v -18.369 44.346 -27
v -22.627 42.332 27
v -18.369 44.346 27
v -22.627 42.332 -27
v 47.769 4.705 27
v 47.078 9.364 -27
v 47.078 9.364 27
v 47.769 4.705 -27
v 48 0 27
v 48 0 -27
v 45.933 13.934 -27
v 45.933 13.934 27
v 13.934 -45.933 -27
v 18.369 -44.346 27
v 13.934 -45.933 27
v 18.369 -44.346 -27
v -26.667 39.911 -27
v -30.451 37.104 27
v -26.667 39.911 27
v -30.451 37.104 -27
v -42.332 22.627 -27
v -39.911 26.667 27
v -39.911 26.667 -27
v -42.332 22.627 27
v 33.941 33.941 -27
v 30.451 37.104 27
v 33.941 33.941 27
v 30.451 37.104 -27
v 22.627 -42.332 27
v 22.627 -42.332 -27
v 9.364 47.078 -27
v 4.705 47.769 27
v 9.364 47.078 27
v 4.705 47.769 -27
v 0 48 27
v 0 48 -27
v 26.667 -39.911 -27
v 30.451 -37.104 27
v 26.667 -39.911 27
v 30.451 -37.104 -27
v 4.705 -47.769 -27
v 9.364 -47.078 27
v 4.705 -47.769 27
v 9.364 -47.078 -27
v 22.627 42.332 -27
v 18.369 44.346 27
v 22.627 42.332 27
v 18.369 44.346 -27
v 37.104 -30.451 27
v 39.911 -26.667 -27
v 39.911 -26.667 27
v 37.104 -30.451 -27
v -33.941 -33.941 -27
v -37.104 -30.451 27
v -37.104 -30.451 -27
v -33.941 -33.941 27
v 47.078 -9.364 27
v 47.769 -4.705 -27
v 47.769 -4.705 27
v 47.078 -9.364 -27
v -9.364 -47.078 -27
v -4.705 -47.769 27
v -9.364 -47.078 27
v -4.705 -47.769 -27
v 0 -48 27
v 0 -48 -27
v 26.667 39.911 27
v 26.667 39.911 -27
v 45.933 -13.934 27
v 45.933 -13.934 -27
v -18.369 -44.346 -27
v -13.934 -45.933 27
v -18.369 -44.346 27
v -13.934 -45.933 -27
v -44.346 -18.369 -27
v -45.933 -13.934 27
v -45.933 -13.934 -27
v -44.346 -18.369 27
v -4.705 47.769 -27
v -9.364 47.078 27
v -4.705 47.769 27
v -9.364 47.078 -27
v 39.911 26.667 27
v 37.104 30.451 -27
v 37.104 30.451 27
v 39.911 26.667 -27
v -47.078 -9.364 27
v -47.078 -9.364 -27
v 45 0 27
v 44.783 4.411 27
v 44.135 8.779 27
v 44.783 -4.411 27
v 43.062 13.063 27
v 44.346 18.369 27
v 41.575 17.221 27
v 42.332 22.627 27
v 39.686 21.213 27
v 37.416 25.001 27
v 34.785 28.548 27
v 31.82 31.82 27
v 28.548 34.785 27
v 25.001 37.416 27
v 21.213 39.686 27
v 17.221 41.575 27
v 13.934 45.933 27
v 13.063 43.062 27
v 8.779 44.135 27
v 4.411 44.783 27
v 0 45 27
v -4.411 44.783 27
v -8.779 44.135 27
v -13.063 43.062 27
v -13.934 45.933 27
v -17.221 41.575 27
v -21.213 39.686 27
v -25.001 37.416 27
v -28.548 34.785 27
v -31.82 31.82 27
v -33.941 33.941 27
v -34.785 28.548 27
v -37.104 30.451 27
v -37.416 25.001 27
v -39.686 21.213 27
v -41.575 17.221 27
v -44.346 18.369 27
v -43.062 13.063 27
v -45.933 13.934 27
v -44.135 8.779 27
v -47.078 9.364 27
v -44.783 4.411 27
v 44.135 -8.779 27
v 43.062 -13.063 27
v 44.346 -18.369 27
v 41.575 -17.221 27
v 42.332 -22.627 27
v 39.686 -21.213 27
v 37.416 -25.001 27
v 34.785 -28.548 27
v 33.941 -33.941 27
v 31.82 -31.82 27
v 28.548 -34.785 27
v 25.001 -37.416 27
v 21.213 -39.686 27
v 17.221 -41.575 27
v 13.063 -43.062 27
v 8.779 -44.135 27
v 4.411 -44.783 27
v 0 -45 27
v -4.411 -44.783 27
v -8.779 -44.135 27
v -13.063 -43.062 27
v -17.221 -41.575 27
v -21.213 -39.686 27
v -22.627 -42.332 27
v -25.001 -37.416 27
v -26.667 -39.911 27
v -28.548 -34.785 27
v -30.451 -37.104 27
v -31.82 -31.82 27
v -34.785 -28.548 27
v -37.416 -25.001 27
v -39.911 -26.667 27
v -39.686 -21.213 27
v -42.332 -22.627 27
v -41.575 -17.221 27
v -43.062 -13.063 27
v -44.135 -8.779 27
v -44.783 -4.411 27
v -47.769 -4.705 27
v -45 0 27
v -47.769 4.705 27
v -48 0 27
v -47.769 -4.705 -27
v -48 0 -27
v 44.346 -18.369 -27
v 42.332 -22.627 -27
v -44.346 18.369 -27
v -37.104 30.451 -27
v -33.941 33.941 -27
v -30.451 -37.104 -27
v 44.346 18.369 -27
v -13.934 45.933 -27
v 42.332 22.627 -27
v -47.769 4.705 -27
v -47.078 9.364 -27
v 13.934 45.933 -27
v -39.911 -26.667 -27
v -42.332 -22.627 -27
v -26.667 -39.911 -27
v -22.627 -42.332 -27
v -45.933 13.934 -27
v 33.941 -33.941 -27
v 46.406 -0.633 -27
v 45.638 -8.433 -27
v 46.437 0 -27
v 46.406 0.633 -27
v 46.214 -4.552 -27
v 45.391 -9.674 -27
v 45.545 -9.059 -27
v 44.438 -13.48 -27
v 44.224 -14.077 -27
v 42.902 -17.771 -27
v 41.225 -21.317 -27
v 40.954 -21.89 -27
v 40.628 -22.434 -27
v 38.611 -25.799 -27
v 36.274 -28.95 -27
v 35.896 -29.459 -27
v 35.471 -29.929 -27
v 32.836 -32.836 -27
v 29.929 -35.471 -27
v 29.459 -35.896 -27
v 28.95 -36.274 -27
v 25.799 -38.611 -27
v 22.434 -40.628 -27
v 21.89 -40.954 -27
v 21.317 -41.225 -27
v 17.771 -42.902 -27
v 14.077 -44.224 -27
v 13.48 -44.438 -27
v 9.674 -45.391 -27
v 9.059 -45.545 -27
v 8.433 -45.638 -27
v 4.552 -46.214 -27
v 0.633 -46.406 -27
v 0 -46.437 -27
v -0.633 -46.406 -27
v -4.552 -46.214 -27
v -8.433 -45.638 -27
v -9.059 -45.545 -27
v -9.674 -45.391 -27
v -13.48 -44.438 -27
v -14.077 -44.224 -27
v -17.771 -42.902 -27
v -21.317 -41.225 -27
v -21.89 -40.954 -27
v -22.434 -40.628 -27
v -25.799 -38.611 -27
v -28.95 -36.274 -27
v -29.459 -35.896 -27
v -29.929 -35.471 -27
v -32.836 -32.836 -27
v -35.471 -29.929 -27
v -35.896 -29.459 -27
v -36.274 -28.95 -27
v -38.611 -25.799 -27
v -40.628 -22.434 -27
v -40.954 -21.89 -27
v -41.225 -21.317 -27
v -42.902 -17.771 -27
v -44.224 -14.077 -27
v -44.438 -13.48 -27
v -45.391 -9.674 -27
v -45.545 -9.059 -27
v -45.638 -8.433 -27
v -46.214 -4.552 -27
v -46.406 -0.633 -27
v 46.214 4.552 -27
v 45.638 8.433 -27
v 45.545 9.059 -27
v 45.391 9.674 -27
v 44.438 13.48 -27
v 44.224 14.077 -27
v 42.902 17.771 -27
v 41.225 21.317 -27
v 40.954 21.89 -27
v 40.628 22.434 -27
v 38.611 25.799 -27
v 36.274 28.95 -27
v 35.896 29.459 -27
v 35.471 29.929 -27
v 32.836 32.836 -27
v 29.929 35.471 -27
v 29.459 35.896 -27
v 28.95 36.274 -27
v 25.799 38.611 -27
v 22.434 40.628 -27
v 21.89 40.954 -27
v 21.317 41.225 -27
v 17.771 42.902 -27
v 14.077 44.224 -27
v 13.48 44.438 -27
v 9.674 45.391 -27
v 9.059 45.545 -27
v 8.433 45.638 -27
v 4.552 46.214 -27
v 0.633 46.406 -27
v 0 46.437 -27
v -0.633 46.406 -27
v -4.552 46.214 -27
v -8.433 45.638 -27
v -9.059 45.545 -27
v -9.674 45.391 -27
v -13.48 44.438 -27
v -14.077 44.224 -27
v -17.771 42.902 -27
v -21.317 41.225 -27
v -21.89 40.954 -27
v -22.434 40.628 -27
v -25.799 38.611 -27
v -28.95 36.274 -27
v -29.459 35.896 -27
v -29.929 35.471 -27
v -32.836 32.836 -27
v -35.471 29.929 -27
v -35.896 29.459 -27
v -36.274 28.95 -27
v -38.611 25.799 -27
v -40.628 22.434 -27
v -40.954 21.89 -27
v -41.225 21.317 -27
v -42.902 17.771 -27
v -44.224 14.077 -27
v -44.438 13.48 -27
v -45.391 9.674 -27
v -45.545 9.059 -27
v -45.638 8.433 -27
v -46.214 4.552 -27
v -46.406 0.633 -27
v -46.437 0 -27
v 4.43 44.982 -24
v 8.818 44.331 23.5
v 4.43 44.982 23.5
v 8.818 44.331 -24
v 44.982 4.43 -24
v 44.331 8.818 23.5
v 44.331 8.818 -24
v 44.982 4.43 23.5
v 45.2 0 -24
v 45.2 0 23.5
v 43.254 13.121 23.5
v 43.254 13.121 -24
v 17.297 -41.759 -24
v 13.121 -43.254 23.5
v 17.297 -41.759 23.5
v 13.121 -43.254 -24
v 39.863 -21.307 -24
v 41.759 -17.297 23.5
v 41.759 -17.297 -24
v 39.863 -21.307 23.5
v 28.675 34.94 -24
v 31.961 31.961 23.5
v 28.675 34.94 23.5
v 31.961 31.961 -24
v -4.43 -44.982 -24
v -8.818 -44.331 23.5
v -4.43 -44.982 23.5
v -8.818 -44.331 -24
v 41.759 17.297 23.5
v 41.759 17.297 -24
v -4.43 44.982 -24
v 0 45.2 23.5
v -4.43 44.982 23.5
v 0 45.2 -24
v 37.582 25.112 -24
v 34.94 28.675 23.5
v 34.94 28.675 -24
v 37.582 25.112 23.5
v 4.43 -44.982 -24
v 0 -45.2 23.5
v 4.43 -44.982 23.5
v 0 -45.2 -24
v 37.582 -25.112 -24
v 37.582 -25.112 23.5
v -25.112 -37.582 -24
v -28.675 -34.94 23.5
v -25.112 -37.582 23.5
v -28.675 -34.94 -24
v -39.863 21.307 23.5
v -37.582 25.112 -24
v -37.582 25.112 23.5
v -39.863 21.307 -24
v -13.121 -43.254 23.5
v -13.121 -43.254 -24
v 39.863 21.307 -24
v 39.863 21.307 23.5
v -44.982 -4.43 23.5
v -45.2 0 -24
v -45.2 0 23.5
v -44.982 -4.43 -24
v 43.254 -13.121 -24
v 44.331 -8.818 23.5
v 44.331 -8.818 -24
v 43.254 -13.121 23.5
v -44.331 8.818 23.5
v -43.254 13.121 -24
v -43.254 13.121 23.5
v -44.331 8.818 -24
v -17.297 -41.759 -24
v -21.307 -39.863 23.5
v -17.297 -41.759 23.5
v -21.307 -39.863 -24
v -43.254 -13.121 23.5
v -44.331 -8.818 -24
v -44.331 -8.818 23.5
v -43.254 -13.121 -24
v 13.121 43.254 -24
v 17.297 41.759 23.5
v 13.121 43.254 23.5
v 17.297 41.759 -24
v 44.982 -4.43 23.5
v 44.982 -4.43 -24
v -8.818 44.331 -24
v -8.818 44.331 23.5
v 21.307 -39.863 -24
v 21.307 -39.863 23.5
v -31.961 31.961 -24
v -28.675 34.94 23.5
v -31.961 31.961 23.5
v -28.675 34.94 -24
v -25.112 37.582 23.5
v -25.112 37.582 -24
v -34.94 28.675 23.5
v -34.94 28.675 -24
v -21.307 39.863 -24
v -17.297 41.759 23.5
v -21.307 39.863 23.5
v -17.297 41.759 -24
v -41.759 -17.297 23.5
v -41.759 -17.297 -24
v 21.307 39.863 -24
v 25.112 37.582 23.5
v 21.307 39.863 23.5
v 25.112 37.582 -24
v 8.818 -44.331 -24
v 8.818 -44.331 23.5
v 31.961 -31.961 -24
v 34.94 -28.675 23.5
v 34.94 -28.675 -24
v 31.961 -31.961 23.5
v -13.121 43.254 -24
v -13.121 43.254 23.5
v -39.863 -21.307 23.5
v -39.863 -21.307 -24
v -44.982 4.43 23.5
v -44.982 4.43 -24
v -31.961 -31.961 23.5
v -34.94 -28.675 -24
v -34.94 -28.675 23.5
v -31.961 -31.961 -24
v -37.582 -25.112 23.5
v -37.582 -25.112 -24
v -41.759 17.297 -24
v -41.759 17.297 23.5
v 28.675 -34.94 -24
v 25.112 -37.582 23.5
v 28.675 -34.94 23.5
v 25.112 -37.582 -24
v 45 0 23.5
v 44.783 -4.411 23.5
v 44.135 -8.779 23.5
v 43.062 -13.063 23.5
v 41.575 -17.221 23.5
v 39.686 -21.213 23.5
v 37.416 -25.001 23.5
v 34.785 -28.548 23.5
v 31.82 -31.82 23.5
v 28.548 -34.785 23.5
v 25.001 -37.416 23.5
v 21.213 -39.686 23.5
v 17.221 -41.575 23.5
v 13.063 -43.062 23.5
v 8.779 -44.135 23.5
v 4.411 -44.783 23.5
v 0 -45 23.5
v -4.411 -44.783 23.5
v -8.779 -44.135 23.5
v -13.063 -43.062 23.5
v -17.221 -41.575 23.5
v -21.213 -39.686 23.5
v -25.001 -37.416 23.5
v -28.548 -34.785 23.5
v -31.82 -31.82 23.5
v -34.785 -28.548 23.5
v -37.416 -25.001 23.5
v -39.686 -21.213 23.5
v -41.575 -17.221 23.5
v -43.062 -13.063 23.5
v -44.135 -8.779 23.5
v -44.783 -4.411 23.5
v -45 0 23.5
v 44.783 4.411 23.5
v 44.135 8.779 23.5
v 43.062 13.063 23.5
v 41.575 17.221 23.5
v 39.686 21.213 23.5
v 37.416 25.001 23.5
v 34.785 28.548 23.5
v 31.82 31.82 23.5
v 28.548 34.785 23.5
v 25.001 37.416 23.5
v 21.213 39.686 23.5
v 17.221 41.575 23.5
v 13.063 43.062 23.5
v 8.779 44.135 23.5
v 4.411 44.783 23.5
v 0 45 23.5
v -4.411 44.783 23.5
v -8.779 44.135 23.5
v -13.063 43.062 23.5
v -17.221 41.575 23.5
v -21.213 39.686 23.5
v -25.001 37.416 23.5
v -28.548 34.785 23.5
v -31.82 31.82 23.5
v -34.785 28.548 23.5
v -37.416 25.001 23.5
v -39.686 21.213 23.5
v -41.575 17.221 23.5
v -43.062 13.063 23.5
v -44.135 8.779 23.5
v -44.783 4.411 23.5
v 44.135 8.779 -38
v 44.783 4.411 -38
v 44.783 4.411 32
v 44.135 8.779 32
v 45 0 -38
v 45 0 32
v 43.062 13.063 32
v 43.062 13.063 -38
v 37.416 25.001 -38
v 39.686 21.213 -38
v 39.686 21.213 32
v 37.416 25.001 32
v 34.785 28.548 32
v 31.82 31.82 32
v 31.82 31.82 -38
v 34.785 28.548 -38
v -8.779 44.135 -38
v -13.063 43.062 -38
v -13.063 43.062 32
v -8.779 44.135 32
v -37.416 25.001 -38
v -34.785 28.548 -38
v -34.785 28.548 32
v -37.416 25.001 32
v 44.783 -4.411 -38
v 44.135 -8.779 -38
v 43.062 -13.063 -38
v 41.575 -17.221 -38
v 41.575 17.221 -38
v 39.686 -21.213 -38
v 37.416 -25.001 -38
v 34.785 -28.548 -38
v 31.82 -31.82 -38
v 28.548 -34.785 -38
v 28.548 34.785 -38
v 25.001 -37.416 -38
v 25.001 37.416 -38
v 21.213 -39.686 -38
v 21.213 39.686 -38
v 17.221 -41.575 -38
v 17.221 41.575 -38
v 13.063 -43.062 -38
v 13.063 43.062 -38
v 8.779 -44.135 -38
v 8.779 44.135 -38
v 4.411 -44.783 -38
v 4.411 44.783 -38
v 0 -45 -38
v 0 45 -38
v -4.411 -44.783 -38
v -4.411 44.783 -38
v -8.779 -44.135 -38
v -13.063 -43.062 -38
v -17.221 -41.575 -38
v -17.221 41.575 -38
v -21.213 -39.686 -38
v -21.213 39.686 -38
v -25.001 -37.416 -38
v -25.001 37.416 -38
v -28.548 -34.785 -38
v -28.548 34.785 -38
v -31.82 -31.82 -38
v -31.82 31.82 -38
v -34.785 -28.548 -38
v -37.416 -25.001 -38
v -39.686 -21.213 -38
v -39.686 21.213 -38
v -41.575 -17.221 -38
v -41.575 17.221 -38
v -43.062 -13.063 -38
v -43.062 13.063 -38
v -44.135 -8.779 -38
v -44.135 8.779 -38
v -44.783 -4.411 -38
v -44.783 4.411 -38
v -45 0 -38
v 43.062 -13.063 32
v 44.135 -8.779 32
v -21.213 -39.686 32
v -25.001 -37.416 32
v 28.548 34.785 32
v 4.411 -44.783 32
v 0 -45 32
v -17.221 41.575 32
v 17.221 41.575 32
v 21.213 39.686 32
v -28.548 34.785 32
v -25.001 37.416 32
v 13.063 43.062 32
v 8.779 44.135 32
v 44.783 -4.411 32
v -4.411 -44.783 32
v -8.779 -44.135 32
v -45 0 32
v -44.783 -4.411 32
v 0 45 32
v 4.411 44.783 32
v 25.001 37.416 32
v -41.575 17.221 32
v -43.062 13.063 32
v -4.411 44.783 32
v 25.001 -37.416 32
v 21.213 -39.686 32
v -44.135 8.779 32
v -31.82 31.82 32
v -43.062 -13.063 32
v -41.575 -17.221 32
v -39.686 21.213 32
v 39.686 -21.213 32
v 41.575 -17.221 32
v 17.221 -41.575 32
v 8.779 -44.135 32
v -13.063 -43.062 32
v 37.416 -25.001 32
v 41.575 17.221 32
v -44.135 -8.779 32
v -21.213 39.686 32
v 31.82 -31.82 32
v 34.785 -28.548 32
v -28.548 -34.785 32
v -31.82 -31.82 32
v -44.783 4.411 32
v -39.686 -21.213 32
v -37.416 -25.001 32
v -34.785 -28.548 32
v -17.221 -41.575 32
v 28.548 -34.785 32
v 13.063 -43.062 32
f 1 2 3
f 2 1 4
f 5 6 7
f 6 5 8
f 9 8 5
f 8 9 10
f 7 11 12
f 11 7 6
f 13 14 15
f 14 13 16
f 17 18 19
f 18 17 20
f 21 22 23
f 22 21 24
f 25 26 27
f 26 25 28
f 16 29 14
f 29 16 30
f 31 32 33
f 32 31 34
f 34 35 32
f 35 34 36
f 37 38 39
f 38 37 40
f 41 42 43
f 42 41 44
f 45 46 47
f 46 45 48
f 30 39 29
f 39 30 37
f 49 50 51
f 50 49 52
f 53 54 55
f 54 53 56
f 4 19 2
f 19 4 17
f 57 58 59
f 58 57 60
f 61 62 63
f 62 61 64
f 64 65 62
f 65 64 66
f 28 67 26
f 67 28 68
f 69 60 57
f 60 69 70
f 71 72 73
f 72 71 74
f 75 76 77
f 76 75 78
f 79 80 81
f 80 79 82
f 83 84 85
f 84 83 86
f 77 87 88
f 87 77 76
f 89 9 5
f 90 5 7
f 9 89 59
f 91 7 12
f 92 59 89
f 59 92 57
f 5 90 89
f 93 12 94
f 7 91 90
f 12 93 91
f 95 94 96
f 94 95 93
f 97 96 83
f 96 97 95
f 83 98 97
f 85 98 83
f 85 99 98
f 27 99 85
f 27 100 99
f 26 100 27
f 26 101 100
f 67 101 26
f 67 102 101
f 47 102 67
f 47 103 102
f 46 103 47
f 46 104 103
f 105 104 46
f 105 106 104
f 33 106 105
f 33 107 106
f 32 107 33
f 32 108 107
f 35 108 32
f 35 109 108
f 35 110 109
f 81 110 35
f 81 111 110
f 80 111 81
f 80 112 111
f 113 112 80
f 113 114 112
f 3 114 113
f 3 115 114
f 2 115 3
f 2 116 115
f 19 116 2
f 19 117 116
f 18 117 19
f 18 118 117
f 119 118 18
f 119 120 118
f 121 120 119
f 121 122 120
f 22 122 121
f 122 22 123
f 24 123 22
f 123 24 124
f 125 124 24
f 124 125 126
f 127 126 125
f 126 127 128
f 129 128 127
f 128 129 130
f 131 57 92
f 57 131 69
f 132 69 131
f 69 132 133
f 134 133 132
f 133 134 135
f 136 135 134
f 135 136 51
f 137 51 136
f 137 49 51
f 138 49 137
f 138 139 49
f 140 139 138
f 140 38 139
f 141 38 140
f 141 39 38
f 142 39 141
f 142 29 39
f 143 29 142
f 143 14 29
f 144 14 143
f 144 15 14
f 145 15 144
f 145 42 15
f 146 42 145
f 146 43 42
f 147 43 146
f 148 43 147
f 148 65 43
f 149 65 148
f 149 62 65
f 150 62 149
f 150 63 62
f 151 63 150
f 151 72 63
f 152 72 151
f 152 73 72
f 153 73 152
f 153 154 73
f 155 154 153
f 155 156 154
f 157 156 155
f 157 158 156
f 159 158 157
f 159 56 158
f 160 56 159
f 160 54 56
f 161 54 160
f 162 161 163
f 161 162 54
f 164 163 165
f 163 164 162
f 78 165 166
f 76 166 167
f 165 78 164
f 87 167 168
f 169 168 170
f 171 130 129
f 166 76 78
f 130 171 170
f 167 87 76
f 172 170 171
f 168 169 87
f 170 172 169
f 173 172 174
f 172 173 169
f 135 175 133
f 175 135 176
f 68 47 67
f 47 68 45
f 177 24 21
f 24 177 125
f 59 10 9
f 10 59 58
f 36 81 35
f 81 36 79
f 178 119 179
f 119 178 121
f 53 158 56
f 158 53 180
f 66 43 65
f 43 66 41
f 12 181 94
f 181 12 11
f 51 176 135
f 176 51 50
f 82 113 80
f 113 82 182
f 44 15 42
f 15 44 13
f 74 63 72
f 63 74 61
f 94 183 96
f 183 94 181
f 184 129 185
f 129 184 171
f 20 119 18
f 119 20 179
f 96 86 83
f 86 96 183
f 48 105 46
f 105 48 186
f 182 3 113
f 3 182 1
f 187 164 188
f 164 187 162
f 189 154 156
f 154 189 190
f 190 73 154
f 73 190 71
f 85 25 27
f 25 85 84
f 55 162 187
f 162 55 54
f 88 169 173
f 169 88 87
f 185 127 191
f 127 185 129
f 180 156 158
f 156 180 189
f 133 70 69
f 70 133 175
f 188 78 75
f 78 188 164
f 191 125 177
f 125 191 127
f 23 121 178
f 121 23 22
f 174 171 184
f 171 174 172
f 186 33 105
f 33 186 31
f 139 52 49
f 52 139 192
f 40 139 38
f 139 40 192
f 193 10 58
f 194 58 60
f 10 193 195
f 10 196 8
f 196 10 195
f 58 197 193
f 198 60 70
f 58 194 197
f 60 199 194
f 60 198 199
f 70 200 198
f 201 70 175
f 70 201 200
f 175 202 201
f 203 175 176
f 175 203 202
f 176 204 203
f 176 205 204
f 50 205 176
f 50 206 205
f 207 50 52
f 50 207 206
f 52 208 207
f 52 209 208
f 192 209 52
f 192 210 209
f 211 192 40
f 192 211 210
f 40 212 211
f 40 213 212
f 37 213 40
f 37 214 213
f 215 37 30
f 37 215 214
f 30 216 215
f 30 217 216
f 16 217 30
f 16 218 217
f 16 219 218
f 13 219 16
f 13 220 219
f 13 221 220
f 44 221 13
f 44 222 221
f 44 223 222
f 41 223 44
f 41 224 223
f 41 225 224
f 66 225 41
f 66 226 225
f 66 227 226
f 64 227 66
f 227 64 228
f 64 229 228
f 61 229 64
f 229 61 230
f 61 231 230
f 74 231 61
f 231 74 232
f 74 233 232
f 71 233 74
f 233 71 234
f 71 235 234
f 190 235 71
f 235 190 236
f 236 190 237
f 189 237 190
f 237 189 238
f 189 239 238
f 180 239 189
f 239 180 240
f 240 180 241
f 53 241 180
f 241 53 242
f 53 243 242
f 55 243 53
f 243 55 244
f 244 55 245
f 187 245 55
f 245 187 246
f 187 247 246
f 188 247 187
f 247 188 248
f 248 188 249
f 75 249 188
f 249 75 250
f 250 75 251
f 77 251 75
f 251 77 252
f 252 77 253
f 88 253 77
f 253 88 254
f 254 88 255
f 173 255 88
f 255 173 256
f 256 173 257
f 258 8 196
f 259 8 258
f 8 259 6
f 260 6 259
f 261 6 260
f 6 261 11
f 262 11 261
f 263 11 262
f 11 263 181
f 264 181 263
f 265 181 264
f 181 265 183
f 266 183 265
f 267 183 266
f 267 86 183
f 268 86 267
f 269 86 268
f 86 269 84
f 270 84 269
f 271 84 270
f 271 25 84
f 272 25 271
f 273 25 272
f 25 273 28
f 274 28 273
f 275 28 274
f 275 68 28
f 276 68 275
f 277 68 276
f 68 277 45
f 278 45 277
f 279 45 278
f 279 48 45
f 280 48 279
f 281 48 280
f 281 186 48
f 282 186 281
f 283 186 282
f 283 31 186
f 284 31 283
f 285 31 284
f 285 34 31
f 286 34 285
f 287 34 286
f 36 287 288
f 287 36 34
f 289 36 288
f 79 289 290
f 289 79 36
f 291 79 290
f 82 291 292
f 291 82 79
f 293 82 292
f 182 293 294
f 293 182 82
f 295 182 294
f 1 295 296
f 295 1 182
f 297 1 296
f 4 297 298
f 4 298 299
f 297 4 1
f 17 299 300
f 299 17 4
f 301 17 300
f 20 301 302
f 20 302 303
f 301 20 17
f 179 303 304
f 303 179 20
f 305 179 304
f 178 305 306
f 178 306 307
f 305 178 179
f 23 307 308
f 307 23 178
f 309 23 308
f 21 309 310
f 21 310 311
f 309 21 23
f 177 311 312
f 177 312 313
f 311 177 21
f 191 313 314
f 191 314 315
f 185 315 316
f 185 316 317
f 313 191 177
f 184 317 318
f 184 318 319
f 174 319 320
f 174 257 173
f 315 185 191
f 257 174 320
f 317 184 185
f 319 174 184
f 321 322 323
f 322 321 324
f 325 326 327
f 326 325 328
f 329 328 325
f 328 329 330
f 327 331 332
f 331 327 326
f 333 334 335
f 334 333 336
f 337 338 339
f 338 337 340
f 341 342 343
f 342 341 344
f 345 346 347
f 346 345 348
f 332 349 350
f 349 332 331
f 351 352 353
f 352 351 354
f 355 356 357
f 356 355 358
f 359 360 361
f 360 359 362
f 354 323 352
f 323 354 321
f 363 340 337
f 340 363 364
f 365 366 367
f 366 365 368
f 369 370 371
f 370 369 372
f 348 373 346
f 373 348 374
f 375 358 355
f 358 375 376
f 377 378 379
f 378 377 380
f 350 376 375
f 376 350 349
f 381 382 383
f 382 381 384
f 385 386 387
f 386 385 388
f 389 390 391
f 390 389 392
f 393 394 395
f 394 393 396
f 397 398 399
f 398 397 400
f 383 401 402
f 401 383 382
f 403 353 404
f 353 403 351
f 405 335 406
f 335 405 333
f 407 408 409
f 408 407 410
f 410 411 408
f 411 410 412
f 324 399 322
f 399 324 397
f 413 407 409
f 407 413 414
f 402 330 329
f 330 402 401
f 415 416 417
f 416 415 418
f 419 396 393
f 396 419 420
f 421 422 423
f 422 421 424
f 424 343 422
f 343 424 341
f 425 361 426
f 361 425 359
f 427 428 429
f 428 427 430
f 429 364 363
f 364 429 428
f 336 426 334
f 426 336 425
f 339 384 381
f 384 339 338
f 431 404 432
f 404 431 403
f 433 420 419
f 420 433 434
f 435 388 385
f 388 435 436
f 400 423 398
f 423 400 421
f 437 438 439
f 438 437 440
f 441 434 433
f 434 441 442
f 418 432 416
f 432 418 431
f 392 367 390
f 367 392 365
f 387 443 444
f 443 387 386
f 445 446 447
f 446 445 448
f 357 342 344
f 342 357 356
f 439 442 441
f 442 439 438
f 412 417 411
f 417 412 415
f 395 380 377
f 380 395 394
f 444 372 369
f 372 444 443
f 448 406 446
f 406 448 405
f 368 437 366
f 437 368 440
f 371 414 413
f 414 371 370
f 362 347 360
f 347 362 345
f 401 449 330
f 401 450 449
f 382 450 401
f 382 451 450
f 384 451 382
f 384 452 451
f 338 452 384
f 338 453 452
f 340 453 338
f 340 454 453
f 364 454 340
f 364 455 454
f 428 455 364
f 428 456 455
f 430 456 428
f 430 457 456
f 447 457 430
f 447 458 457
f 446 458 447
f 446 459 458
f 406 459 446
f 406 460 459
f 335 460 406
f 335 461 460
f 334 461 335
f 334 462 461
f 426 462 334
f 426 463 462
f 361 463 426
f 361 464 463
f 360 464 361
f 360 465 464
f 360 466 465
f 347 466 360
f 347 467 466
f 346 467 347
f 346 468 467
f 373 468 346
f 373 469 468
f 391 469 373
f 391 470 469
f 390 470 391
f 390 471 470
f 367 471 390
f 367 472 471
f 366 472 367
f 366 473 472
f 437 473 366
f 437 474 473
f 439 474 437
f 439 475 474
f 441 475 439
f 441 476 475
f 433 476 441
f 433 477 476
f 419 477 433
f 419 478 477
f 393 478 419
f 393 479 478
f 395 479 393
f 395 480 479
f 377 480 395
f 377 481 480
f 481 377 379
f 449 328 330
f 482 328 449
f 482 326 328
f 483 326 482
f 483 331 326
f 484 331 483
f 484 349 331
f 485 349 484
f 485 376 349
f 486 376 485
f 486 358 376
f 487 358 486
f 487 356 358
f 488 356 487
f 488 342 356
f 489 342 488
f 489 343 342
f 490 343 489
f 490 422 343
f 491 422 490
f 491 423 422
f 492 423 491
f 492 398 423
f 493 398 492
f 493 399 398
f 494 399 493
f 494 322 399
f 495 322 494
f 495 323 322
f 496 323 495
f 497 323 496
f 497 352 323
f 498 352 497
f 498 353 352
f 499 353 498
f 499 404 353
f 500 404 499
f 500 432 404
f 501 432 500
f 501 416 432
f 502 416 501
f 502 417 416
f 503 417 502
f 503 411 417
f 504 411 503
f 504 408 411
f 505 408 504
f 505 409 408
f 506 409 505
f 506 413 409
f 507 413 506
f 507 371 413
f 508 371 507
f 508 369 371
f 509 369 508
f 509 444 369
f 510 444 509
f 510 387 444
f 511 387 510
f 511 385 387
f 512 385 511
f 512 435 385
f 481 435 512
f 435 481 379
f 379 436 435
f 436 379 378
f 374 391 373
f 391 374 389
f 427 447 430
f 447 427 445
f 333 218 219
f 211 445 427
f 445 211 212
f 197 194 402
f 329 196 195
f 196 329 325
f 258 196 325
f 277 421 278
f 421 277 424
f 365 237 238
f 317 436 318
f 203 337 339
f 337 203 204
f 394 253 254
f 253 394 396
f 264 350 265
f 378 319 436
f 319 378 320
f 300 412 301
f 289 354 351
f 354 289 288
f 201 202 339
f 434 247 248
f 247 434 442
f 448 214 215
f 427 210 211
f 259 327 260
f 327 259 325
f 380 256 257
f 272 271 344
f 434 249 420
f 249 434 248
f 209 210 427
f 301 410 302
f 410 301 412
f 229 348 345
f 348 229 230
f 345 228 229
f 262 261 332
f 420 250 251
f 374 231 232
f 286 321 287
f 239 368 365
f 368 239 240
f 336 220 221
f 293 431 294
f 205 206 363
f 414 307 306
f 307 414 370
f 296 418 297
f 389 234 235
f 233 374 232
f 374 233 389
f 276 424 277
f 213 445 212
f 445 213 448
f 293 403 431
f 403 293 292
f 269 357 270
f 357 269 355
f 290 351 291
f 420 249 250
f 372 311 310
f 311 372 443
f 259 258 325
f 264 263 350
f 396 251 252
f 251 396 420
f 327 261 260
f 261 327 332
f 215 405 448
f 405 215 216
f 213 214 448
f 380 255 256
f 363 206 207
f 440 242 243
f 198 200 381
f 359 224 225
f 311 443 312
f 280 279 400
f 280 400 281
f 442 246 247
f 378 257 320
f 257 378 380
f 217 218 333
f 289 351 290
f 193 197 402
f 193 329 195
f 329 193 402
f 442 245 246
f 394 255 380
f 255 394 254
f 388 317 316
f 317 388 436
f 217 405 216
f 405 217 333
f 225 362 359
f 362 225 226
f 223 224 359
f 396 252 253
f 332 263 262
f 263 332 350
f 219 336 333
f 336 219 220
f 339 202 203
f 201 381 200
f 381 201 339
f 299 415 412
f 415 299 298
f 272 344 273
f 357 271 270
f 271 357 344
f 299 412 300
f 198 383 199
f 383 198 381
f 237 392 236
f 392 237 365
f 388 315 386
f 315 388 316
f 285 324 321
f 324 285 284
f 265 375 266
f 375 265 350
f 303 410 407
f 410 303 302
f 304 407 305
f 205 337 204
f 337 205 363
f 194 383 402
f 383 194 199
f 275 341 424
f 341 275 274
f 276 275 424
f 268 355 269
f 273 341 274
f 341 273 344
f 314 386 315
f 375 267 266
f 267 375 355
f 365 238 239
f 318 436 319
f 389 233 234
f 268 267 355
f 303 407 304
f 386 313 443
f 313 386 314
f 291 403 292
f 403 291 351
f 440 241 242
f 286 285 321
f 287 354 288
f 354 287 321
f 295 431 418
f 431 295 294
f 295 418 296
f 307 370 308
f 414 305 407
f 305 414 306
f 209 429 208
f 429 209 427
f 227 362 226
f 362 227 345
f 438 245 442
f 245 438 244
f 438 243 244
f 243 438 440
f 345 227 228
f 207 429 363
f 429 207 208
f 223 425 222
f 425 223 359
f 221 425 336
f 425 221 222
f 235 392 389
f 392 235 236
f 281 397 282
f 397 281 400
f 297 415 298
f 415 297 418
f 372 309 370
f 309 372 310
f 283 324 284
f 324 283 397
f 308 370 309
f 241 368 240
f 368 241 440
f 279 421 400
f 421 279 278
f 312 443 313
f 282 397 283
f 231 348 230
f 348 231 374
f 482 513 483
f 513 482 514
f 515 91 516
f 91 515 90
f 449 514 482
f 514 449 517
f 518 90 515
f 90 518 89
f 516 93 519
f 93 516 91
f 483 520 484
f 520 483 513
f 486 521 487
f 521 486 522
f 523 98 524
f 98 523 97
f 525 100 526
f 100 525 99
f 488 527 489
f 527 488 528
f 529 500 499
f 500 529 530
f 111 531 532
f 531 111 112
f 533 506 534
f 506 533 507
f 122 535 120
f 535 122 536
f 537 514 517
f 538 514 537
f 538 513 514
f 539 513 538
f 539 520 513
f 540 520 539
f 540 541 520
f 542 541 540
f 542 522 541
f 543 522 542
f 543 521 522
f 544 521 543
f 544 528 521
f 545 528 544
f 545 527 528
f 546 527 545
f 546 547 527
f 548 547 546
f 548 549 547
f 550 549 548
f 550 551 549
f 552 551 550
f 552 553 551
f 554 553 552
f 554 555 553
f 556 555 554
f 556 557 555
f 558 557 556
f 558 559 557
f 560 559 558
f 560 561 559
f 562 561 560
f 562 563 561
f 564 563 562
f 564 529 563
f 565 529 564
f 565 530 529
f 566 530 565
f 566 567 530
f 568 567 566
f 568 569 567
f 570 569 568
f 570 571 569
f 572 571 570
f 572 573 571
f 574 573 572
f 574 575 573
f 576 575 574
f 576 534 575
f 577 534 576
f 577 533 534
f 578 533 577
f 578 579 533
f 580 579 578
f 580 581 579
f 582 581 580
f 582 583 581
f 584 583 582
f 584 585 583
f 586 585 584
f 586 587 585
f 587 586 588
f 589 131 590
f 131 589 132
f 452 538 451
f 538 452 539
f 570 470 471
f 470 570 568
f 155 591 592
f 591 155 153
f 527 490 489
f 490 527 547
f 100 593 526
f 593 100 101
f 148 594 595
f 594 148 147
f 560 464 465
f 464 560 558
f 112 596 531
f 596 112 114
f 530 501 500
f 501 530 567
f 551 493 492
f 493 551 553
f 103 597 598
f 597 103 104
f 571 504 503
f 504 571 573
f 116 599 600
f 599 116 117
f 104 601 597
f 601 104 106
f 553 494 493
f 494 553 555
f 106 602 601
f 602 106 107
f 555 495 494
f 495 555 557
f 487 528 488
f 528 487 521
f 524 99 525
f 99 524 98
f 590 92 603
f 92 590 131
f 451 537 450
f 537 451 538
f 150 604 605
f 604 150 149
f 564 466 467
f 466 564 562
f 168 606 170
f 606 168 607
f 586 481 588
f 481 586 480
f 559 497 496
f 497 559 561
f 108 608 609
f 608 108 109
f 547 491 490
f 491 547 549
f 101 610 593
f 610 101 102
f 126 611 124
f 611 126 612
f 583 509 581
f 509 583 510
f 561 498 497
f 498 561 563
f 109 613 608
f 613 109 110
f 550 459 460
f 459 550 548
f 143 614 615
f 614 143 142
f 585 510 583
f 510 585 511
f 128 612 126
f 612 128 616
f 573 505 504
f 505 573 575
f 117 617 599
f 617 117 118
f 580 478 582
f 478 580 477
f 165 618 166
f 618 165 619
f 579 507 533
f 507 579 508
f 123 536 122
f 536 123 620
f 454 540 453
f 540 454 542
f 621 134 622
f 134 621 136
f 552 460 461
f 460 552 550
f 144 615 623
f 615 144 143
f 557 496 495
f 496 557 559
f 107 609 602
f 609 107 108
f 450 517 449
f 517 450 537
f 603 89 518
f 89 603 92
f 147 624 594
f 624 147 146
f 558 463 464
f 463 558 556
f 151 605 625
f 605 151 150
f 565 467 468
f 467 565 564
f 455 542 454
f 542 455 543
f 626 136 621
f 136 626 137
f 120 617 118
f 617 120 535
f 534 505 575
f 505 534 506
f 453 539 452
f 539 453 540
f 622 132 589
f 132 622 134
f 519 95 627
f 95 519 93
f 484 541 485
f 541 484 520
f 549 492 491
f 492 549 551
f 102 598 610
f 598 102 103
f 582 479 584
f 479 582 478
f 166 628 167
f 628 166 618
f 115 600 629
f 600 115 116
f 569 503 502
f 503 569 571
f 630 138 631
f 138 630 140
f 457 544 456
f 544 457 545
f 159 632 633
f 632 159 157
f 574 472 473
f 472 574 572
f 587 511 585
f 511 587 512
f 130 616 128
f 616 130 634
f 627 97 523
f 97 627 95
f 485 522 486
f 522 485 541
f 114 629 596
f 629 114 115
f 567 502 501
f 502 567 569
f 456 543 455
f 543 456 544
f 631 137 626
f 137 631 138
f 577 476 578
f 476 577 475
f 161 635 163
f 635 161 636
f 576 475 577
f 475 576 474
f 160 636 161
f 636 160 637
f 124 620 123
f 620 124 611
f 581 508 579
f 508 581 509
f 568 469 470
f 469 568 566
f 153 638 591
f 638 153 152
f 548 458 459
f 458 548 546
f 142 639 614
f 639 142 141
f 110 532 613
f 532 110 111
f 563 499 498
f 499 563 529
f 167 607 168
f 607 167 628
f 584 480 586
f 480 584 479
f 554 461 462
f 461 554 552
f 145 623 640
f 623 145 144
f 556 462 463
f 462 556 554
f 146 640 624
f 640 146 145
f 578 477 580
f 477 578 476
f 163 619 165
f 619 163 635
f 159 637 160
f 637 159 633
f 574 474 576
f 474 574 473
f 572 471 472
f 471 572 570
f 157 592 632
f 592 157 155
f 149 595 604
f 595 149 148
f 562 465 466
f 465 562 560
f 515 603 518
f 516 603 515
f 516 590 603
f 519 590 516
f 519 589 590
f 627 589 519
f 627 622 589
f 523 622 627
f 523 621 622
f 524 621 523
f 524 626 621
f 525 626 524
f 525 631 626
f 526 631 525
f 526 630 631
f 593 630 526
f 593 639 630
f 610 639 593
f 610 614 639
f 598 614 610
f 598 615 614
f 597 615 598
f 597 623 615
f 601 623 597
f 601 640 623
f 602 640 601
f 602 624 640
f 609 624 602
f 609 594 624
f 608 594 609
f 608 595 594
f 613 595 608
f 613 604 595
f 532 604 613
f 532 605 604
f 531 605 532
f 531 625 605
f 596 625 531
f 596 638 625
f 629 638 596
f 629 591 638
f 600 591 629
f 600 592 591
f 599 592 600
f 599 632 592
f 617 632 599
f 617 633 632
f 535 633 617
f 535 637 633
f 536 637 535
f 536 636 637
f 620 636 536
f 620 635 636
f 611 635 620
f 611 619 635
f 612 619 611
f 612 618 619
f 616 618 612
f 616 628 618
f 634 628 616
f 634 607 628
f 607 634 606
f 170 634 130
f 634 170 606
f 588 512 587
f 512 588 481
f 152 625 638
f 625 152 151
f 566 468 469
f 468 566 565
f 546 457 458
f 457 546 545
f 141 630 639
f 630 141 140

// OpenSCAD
// Parameters
nominal_diameter = 90; //[45:180:1]
pipe_outer_diameter = 90; //[45:180:0.1]
socket_depth = 50; //[25:100:1]
wall_thickness = 3; //[1.5:6:0.1]
cap_end_thickness = 4; //[2:8:0.1]
lead_in_chamfer_angle = 30; //[10:60:1]
clearance = 0.2; //[0:0.6:0.05]
overlap = 1; //[0.5:2:0.1]
cap_outer_diameter = 96; //[48:192:0.1]
cap_total_length = 54; //[27:108:0.1]
socket_inner_diameter = 90.4; //[45:181:0.1]
chamfer_axial_length = 2.5; //[1:6:0.1]
ht_pipe_length = 70; //[35:140:1]

// HT Pipe - complete geometry
module ht_pipe() {
  color([0.0, 0.4, 0.2]) { // Green for PVC
    cylinder(h=ht_pipe_length, r=pipe_outer_diameter/2, center=true, $fn=64);
  }
}

// Cap assembly
module cap_with_pipe() {
  difference() {
    // Cap body
    color([0.85, 0.85, 0.8]) { // Off-white for PVC
      translate([0, 0, 0])
        cylinder(h=cap_total_length, r=cap_outer_diameter/2, center=true, $fn=64);
    }
    // Inner bore
    translate([0, 0, -cap_total_length/2 + socket_depth/2])
      cylinder(h=socket_depth + overlap, r=socket_inner_diameter/2, center=true, $fn=64);
    // Lead-in chamfer
    translate([0, 0, -cap_total_length/2 + chamfer_axial_length/2])
      cylinder(h=chamfer_axial_length + overlap, r1=socket_inner_diameter/2 + chamfer_axial_length*tan(lead_in_chamfer_angle), r2=socket_inner_diameter/2, center=true, $fn=64);
  }
  // HT Pipe
  translate([0, 0, -cap_total_length/2 + socket_depth/2 - overlap])
    ht_pipe();
}

// Final assembly
module assembly() {
  cap_with_pipe();
}

assembly();
